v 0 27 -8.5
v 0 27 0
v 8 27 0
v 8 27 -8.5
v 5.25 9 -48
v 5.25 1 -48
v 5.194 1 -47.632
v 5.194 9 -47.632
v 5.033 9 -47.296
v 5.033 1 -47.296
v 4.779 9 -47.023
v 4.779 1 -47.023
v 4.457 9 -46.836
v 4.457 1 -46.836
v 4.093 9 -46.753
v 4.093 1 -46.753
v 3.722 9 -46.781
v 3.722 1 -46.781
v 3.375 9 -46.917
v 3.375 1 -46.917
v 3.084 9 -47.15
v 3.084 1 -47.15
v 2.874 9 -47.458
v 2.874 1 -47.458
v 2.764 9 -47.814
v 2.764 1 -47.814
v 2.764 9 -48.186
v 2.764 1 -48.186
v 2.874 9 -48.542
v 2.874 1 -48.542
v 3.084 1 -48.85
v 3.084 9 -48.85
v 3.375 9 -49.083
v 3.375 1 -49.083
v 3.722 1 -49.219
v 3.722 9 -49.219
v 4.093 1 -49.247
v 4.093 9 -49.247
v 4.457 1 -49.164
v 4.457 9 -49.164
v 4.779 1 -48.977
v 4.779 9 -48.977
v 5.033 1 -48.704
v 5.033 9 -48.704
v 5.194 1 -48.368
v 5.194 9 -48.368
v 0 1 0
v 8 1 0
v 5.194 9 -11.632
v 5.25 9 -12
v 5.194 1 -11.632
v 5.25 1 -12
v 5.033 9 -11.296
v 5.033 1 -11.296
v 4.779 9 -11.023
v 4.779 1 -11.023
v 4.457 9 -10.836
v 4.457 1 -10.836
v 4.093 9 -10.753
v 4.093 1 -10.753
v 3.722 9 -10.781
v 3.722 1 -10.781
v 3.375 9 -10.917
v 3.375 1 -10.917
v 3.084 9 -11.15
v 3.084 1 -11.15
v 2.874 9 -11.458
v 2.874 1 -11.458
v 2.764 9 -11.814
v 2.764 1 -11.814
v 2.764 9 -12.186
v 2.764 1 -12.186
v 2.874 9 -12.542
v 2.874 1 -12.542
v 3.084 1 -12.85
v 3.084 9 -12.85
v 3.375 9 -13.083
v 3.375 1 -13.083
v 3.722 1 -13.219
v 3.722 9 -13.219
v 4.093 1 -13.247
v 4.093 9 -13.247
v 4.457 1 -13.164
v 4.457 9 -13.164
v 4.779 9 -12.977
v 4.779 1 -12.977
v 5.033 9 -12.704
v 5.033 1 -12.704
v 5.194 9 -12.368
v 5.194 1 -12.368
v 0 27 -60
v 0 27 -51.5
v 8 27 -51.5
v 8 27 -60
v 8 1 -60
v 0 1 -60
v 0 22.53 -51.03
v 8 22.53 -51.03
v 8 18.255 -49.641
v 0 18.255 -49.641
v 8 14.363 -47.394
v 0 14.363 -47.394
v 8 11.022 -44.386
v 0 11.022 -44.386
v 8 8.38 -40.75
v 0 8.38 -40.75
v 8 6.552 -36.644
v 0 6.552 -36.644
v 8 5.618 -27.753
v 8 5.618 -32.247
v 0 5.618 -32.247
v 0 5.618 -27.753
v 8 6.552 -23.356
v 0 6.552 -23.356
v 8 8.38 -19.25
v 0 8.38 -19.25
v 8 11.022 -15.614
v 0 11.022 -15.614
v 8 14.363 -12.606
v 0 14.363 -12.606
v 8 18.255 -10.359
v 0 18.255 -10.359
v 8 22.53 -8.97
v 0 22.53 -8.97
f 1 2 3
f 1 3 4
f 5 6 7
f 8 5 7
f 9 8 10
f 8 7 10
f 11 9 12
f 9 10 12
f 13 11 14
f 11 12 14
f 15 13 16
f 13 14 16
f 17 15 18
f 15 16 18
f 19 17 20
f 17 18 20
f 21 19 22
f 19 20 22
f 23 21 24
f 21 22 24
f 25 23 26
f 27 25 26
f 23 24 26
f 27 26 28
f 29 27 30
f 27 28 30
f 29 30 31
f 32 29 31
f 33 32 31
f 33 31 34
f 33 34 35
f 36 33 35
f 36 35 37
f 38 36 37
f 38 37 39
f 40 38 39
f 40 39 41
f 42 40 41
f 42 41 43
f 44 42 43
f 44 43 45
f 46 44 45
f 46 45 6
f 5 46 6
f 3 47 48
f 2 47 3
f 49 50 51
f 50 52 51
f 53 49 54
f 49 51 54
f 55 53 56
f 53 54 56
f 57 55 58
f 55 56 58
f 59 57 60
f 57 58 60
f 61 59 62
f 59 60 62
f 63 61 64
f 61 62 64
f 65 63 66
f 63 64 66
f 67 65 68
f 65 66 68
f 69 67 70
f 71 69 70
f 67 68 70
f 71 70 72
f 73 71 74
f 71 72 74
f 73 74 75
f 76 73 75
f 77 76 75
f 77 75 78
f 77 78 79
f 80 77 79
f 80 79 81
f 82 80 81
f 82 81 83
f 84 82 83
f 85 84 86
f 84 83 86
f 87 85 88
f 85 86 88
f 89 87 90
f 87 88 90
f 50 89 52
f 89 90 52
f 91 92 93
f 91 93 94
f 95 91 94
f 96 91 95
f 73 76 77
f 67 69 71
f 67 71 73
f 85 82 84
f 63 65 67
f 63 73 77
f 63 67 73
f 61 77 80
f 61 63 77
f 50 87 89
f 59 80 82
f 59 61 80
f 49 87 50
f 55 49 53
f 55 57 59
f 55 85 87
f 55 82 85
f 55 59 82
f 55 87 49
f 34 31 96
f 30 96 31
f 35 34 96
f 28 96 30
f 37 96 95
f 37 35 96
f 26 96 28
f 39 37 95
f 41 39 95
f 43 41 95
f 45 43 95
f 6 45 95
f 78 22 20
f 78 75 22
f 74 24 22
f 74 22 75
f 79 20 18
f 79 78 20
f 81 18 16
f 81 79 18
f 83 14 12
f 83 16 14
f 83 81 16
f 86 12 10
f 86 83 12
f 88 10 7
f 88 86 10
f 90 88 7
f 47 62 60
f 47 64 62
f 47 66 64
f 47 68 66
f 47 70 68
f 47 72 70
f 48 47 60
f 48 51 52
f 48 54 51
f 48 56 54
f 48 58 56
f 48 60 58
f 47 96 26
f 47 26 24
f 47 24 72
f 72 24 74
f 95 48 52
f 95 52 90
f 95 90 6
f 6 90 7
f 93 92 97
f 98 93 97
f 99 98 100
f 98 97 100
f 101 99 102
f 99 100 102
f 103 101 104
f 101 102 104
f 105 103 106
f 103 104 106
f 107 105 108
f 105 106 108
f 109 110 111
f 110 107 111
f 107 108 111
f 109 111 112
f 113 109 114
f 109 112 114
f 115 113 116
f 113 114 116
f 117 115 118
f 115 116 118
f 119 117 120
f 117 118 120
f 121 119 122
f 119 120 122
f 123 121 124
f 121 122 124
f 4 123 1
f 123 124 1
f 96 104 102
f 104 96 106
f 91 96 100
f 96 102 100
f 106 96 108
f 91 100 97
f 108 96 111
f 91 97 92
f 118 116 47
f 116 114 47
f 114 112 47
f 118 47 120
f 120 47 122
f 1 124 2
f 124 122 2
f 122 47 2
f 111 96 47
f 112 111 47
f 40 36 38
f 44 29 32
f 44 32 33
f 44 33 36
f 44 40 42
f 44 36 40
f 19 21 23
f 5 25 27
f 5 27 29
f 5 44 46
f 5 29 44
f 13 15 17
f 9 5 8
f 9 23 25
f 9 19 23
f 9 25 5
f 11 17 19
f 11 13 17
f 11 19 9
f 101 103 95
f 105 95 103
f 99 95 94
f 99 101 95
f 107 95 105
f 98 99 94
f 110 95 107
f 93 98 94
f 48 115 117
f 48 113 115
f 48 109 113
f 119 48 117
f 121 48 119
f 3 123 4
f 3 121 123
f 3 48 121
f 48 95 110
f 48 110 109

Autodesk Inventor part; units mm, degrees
ref_plane "YZ Plane" through (0, 0, 0) normal (1, 0, 0) x (0, 1, 0)
ref_plane "XZ Plane" through (0, 0, 0) normal (0, 1, 0) x (-1, 0, 0)
ref_plane "XY Plane" through (0, 0, 0) normal (0, 0, 1) x (1, 0, 0)
sketch "스케치1" plane through (0, 0, 0) normal (1, 0, 0) x (0, 1, 0)
  line L0 (0, 0) -> (27, 0)
  line L1 (27, -60) -> (0, -60)
  line L2 (0, -60) -> (0, 0)
  arc A0 (27, -8.5) -> (27, -51.5) centre (27, -30) ccw
  line L3 (27, 0) -> (27, -8.5)
  line L4 (27, -51.5) -> (27, -60)
  dimension "d0" = 27
  dimension "d3" = 60
  dimension "d4" = 27
  dimension "d5" = 21.5
  dimension "d6" = 27
  dimension "d7" = 30
extrude "돌출1" add sketch "스케치1" along normal blind 8
sketch "스케치2" plane through (0, 0, -60) normal (0, -1, 0) x (1, 0, 0)
  line L0 (0, 0) -> (0, 60) projected
  line L1 (0, 0) -> (8, 0) projected
  line L2 (8, 60) -> (8, 0) projected
  line L3 (0, 60) -> (8, 60) projected
  line L4 (0, 60) -> (0, 51.5) projected
  line L5 (0, 60) -> (8, 60) projected
  line L6 (8, 51.5) -> (8, 60) projected
  line L7 (0, 51.5) -> (8, 51.5) projected
  line L8 (0, 8.5) -> (0, 0) projected
  line L9 (0, 8.5) -> (8, 8.5) projected
  line L10 (8, 0) -> (8, 8.5) projected
  line L11 (0, 0) -> (8, 0) projected
  circle A0 centre (4, 48) radius 1.25
  circle A1 centre (4, 12) radius 1.25
  dimension "d10" = 2.5
  dimension "d11" = 2.5
  dimension "d12" = 4
  dimension "d13" = 4
  dimension "d14" = 12
  dimension "d15" = 12
extrude "돌출2" cut sketch "스케치2" against normal blind 9 contours A0 | A1
sketch "스케치3" plane through (0, 0, -60) normal (0, -1, 0) x (1, 0, 0)
  circle A0 centre (4, 48) radius 1.25 projected
  circle A1 centre (4, 12) radius 1.25 projected
  line L0 (0, 0) -> (0, 60) projected
  line L1 (0, 0) -> (8, 0) projected
  line L2 (8, 60) -> (8, 0) projected
  line L3 (0, 60) -> (8, 60) projected
extrude "돌출3" cut sketch "스케치3" against normal blind 1
properties part number "모터받침대" material "ABS 플라스틱"
